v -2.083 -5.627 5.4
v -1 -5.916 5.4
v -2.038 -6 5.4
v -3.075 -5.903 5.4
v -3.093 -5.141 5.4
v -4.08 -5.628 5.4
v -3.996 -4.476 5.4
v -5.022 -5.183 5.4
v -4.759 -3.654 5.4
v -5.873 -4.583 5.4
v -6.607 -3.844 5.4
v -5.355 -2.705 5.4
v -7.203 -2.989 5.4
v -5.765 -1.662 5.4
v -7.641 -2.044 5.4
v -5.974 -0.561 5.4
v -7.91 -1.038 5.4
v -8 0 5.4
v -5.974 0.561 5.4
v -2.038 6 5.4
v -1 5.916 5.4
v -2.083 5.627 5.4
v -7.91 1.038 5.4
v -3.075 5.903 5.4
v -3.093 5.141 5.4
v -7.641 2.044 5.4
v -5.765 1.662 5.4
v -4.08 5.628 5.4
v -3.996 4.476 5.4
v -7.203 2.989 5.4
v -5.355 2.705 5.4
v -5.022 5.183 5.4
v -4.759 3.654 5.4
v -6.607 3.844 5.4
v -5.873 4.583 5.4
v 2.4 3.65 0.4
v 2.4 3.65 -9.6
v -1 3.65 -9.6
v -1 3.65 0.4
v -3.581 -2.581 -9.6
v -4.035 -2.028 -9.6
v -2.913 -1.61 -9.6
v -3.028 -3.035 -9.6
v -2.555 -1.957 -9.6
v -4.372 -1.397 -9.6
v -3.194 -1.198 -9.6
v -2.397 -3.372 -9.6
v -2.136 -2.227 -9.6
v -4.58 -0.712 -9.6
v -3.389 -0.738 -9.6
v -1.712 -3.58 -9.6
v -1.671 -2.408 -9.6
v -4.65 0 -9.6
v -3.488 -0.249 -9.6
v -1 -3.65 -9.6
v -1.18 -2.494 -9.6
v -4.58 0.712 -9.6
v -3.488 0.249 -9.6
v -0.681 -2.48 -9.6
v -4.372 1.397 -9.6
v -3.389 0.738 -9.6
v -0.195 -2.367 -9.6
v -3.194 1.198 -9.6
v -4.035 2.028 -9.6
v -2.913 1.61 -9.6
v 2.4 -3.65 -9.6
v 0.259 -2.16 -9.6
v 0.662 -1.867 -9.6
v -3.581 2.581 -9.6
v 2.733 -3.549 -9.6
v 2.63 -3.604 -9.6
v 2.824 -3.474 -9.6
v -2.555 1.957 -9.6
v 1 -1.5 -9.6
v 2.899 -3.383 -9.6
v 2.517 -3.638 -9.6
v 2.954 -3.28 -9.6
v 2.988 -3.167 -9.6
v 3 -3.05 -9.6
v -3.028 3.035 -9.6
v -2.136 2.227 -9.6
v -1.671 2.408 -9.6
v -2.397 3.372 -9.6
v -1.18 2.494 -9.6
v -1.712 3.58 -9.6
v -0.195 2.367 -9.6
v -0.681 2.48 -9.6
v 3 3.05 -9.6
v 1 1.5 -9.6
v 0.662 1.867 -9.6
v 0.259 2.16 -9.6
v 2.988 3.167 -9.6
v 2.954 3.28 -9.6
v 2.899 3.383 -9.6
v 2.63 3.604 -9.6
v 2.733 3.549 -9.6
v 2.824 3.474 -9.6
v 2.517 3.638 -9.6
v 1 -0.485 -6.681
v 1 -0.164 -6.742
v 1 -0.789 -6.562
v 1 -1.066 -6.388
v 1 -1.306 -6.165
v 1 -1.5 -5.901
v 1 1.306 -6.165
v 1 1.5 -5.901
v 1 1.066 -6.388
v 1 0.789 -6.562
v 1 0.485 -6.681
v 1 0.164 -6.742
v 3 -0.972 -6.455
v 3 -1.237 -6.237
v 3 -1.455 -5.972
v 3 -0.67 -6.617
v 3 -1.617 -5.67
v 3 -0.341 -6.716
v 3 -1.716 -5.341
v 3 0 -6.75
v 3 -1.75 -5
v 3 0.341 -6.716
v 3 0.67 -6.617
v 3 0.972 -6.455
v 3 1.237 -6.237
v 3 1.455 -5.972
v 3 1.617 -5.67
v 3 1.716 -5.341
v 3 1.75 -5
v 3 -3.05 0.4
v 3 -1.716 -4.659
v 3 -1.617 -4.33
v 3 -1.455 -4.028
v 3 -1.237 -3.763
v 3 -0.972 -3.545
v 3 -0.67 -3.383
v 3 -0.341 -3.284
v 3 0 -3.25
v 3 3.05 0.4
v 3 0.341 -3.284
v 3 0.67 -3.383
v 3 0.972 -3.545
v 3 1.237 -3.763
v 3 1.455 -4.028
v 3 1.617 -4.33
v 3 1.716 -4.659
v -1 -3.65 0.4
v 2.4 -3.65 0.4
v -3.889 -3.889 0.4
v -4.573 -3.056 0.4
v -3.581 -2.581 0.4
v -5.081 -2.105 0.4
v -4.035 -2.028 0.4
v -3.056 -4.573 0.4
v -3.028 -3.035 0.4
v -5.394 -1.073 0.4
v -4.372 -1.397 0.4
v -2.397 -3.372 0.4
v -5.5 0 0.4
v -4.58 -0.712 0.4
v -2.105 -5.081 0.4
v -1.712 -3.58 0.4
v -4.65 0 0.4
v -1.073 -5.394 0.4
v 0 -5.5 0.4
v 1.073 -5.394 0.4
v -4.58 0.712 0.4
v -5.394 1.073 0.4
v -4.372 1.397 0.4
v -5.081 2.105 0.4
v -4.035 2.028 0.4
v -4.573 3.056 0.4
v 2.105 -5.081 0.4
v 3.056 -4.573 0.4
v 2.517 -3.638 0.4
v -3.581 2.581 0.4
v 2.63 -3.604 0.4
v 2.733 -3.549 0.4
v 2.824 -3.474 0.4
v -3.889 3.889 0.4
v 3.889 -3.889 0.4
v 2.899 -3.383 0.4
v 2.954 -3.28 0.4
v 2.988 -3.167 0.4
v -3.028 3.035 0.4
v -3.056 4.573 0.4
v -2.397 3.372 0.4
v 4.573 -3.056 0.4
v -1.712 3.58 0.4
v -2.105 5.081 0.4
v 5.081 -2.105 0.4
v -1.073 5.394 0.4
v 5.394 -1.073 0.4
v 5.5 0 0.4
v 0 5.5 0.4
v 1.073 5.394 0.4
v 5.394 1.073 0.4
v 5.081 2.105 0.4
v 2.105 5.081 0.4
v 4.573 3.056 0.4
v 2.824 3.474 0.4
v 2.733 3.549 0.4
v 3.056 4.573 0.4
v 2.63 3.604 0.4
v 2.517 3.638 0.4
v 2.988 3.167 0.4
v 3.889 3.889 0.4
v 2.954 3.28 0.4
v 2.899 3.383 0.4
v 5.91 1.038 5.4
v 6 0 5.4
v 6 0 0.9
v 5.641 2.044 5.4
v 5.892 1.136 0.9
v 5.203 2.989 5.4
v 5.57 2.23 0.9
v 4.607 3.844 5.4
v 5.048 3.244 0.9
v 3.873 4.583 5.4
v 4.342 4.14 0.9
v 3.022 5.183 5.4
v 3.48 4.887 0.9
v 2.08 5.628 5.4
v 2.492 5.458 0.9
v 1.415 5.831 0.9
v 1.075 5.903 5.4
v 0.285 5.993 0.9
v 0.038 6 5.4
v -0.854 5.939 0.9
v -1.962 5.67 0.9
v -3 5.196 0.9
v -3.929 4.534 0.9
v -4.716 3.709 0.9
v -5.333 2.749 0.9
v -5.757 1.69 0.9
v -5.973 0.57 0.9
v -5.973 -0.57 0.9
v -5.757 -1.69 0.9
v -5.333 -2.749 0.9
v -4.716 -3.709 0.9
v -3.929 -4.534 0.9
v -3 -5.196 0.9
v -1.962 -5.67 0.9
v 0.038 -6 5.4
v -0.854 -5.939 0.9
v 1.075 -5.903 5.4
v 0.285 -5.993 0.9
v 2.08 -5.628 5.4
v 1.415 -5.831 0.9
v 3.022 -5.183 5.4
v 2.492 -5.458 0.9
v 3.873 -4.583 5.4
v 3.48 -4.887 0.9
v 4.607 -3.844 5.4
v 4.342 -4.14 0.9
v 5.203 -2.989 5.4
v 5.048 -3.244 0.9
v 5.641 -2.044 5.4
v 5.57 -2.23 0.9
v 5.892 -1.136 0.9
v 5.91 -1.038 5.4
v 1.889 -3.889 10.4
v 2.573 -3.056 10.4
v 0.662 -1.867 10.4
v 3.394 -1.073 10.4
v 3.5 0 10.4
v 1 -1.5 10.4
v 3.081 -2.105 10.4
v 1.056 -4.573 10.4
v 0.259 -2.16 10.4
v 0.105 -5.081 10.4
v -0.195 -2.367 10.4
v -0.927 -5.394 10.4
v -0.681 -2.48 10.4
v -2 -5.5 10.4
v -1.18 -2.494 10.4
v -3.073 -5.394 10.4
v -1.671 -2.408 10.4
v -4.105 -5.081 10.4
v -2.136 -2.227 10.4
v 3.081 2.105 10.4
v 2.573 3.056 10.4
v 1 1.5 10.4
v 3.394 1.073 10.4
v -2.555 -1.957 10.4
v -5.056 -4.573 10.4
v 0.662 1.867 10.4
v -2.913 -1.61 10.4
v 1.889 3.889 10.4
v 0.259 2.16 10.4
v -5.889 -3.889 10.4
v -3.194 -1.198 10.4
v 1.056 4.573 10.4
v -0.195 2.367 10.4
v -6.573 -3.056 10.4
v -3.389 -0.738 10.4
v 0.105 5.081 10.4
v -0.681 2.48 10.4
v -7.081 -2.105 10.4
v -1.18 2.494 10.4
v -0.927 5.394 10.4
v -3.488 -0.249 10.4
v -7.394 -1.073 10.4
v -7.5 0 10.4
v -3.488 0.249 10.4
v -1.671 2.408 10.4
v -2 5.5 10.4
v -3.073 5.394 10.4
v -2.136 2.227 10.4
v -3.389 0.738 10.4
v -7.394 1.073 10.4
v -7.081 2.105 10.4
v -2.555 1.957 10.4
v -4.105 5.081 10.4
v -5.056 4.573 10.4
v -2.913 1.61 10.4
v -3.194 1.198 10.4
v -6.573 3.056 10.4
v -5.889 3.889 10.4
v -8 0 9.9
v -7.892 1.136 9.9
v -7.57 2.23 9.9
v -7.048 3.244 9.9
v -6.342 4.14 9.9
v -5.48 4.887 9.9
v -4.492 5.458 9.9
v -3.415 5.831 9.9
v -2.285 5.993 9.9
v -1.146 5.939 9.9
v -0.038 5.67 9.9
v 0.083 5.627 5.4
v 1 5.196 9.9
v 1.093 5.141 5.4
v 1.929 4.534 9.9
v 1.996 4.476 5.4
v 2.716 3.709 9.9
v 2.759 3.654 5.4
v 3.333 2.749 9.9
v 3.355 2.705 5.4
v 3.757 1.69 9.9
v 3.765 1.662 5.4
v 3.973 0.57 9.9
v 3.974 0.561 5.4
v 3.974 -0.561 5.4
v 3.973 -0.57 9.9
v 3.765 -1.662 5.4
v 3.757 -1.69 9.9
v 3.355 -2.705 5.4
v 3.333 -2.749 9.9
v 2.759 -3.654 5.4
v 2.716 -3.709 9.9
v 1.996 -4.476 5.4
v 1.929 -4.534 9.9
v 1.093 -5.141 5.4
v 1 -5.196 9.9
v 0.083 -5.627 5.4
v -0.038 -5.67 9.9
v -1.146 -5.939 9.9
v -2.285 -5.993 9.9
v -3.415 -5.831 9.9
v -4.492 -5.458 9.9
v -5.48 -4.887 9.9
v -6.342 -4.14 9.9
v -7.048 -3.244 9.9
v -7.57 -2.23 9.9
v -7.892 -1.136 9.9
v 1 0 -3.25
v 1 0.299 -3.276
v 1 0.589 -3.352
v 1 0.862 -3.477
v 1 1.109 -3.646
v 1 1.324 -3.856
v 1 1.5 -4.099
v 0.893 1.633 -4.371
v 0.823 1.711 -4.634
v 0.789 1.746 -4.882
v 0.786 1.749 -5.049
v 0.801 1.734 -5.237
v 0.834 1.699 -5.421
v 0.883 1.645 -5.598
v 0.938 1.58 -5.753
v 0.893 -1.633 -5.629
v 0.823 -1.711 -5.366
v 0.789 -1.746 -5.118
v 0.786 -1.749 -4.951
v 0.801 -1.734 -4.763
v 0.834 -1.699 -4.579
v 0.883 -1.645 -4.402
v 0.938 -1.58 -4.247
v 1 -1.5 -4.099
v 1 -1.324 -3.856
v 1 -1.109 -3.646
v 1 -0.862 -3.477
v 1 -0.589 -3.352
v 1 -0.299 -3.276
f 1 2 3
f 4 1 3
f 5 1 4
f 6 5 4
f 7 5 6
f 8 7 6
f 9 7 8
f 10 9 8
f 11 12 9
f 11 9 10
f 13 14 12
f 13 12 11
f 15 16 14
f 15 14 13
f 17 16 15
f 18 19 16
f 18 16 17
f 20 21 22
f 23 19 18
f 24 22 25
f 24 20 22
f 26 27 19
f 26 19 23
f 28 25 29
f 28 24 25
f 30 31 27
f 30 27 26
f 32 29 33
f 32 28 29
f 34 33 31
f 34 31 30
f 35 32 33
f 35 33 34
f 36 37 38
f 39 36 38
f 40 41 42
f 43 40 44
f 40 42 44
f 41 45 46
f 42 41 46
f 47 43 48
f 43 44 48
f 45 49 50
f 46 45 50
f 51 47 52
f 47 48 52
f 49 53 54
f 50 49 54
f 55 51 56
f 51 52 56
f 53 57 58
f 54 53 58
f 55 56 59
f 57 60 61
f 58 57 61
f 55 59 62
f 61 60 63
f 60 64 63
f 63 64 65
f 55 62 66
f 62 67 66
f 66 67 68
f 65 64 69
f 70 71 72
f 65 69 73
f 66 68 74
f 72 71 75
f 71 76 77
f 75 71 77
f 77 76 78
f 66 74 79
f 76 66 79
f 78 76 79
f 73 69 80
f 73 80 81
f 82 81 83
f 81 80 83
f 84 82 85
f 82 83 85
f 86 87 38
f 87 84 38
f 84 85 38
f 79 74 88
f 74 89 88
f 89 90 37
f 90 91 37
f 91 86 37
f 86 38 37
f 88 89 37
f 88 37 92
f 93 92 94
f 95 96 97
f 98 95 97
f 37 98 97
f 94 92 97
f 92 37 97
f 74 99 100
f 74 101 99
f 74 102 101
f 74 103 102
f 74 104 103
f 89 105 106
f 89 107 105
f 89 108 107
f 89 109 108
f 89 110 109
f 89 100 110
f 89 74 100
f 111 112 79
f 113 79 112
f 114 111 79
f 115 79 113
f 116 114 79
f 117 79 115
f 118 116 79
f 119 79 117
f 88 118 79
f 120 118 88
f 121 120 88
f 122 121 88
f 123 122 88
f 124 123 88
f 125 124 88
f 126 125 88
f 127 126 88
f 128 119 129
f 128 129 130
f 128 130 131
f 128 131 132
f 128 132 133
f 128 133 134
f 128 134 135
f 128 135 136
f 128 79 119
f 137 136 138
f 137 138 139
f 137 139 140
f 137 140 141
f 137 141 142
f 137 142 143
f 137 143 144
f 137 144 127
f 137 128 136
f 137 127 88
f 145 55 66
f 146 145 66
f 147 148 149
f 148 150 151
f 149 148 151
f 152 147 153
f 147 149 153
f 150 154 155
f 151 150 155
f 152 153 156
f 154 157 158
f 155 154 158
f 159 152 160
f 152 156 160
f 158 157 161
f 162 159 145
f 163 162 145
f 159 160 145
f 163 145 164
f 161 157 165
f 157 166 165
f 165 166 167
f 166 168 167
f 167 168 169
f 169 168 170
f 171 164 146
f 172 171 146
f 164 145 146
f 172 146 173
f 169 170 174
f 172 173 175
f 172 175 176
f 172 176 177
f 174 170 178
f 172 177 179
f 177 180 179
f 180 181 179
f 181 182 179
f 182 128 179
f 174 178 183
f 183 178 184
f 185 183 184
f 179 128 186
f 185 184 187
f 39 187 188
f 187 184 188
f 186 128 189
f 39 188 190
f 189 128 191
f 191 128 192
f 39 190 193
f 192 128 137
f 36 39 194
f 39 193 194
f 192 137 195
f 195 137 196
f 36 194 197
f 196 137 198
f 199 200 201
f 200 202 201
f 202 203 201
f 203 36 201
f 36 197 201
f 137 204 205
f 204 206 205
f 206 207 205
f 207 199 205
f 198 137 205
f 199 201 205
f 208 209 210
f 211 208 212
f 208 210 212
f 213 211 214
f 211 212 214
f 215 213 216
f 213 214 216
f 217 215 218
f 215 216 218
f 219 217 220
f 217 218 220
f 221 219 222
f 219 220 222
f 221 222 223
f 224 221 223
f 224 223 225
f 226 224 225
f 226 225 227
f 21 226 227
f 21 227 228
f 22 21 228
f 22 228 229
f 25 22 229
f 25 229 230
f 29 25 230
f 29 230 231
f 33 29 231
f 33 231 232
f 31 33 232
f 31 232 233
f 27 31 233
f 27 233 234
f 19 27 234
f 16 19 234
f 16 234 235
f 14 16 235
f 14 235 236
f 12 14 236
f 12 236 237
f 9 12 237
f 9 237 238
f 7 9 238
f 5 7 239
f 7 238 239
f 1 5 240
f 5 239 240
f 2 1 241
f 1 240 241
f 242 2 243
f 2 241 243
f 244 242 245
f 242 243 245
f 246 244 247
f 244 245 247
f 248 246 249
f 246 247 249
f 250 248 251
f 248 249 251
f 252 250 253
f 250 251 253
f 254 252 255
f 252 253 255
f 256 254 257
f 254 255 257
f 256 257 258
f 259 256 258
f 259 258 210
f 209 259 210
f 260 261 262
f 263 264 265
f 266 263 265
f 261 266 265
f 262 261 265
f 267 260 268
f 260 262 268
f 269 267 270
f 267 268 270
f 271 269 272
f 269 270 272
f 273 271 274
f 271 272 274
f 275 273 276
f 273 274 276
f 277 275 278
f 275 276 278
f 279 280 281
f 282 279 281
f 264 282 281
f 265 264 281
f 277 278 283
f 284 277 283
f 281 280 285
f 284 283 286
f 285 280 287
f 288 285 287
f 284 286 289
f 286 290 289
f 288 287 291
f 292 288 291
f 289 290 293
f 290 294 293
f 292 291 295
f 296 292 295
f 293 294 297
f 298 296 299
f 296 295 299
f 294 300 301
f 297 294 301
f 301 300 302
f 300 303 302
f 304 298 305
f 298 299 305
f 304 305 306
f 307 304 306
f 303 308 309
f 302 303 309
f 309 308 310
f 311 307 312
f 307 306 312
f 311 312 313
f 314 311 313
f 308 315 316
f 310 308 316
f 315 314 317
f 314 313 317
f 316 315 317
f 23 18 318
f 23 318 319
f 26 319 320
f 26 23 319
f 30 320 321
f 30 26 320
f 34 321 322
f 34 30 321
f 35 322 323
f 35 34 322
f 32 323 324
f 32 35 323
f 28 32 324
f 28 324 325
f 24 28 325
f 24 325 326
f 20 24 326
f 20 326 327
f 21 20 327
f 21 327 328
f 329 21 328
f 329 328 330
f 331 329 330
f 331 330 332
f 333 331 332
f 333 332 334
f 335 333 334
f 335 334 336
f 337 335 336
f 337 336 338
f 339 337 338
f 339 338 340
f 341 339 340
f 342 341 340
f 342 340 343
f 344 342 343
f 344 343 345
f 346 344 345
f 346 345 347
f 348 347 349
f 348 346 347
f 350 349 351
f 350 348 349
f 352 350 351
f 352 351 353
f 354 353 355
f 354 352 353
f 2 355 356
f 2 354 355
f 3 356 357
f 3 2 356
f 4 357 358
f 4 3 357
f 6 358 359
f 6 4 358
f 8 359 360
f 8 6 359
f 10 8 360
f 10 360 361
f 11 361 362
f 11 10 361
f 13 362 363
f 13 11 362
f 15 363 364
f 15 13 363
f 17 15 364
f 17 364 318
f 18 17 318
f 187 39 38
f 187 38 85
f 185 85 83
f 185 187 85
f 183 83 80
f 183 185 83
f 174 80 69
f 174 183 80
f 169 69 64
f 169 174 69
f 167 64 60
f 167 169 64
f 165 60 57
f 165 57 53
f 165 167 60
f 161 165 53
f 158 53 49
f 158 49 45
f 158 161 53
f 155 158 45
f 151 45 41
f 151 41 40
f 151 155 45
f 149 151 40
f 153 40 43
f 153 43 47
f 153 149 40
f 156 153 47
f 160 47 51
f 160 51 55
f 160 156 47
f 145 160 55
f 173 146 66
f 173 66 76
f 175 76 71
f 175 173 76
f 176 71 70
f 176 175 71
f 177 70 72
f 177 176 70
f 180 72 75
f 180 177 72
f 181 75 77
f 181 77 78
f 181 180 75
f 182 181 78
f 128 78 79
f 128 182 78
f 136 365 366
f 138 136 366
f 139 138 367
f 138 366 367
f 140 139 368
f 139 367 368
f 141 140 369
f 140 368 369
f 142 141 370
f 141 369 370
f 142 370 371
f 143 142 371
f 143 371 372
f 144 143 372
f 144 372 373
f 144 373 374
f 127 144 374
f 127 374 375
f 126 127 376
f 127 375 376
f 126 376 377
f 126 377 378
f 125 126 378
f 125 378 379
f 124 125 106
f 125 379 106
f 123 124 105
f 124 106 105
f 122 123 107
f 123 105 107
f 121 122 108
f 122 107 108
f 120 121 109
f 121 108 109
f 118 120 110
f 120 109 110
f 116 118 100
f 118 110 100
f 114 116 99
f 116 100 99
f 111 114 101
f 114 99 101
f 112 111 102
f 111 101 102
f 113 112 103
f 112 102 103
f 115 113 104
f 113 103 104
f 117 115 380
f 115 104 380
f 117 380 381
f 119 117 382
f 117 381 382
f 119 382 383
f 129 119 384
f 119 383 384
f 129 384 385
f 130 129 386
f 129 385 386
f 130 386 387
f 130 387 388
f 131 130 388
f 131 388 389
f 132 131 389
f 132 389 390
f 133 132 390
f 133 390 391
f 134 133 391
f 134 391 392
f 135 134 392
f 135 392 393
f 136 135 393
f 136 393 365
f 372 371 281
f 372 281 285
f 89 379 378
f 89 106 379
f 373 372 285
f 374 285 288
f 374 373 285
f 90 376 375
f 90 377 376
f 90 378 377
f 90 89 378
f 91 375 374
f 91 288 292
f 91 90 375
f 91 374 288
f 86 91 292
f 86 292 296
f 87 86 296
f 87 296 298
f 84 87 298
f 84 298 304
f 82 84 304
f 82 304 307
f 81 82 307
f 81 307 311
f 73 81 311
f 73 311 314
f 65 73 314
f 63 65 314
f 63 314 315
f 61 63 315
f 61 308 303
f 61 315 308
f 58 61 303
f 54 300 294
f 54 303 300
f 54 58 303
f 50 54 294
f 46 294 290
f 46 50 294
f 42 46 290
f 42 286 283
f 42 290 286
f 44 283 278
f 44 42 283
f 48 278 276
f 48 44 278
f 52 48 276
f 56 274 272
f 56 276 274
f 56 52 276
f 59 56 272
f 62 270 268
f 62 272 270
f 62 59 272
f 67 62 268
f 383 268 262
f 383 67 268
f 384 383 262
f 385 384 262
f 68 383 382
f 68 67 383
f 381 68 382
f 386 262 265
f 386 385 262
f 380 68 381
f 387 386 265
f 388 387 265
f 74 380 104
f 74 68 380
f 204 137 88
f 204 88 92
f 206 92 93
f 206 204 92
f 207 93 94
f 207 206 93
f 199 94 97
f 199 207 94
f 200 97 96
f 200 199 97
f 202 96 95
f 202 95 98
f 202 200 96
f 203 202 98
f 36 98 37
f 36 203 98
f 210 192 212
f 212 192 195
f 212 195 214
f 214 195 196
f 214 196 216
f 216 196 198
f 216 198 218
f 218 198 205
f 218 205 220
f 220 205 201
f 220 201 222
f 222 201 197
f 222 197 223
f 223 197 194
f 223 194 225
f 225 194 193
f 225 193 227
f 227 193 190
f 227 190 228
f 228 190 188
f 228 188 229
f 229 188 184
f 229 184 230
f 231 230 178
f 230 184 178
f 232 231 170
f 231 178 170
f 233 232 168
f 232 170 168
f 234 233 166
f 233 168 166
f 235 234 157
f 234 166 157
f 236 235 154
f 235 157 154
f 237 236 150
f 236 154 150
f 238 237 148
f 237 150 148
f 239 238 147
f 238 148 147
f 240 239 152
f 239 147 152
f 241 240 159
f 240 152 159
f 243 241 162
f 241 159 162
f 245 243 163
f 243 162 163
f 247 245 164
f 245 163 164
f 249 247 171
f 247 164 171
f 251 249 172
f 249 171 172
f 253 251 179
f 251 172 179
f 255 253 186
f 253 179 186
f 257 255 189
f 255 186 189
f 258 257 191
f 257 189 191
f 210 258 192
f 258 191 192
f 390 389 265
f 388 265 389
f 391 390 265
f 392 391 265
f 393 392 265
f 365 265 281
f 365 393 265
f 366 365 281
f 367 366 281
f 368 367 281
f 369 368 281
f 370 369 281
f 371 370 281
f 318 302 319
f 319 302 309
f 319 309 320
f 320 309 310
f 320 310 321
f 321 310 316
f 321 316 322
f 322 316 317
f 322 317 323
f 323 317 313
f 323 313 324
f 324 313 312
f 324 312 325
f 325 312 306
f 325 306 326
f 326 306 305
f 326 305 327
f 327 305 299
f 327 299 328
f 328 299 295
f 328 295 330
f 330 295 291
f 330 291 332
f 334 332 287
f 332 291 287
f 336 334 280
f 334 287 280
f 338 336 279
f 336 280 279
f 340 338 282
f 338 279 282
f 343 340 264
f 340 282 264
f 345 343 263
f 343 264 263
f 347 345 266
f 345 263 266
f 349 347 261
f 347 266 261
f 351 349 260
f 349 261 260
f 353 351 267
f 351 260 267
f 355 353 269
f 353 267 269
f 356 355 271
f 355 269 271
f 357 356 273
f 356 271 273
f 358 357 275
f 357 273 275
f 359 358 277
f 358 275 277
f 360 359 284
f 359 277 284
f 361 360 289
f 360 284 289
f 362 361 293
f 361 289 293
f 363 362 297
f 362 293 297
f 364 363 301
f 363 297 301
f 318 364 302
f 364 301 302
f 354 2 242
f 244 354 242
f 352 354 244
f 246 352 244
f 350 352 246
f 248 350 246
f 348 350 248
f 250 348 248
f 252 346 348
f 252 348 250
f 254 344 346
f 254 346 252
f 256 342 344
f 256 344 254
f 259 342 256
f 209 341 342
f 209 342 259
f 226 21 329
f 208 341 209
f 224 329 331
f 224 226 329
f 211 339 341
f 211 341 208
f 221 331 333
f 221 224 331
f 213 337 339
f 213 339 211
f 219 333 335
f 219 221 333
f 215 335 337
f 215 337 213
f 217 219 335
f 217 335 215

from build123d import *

# Parameters (mm, degrees)
SKETCH10_R                     = 6
BOSS_EXTRUDE4_DEPTH            = 5
BOSS_EXTRUDE5_DEPTH            = 10
SKETCH16_R                     = 6
BOSS_EXTRUDE6_DEPTH            = 5
CUT_EXTRUDE2_DEPTH             = 23.360679775
F_3_5_3_5_DIAMETER_HOLE0_D     = 3.5
F_3_5_3_5_DIAMETER_HOLE0_DEPTH = 4
F_3_5_3_5_DIAMETER_HOLE0_TIP   = 1.051506083
CHAMFER2_SIZE                  = 0.5


with BuildPart() as part:
    # Sketch10 → Boss-Extrude4 (new body)
    with BuildSketch(Plane.XY.offset(0.4)):
        Circle(SKETCH10_R)
    extrude(amount=BOSS_EXTRUDE4_DEPTH)

    # Sketch11 → Boss-Extrude5 (add)
    with BuildSketch(Plane(origin=(0, 0, 0.4), x_dir=(-1, 0, 0), z_dir=(0, 0, -1))):
        with BuildLine():
            Line((-3, -3.05), (-3, 3.05))
            ThreePointArc((-3, 3.05), (-2.824264069, 3.474264069), (-2.4, 3.65))
            Line((-2.4, 3.65), (1, 3.65))
            ThreePointArc((1, 3.65), (4.65, 0), (1, -3.65))
            Line((1, -3.65), (-2.4, -3.65))
            ThreePointArc((-2.4, -3.65), (-2.824264069, -3.474264069), (-3, -3.05))
        make_face()
    extrude(amount=BOSS_EXTRUDE5_DEPTH)

    # Sketch16 → Boss-Extrude6 (add)
    with BuildSketch(Plane(origin=(0, 0, 5.4), x_dir=(-1, 0, 0), z_dir=(0, 0, -1))):
        with Locations((2, 0)):
            Circle(SKETCH16_R)
    extrude(amount=-BOSS_EXTRUDE6_DEPTH)

    # Sketch17 → Cut-Extrude2 (cut, through all)
    with BuildSketch(Plane.XY.offset(-9.6)):
        with BuildLine():
            Line((1, -1.5), (1, 1.5))
            ThreePointArc((1, 1.5), (-3.5, 0), (1, -1.5))
        make_face()
    extrude(amount=CUT_EXTRUDE2_DEPTH, mode=Mode.SUBTRACT)

    # Ø3.5 (3.5) Diameter Hole0
    with Locations(Plane(origin=(3, 0, 0), x_dir=(0, 0, -1), z_dir=(1, 0, 0))):
        with Locations((5, 0)):
            Hole(F_3_5_3_5_DIAMETER_HOLE0_D / 2, depth=F_3_5_3_5_DIAMETER_HOLE0_DEPTH)
            with Locations((0, 0, -(F_3_5_3_5_DIAMETER_HOLE0_DEPTH + F_3_5_3_5_DIAMETER_HOLE0_TIP / 2))):  # 118° drill point
                Cone(0, F_3_5_3_5_DIAMETER_HOLE0_D / 2, F_3_5_3_5_DIAMETER_HOLE0_TIP, mode=Mode.SUBTRACT)

    # Chamfer2
    chamfer2_edges = [part.edges().sort_by_distance(p)[0] for p in [
        (-6, 0, 0.4),
        (4, 0, 10.4),
    ]]
    chamfer(chamfer2_edges, length=CHAMFER2_SIZE)


solid = part.part
